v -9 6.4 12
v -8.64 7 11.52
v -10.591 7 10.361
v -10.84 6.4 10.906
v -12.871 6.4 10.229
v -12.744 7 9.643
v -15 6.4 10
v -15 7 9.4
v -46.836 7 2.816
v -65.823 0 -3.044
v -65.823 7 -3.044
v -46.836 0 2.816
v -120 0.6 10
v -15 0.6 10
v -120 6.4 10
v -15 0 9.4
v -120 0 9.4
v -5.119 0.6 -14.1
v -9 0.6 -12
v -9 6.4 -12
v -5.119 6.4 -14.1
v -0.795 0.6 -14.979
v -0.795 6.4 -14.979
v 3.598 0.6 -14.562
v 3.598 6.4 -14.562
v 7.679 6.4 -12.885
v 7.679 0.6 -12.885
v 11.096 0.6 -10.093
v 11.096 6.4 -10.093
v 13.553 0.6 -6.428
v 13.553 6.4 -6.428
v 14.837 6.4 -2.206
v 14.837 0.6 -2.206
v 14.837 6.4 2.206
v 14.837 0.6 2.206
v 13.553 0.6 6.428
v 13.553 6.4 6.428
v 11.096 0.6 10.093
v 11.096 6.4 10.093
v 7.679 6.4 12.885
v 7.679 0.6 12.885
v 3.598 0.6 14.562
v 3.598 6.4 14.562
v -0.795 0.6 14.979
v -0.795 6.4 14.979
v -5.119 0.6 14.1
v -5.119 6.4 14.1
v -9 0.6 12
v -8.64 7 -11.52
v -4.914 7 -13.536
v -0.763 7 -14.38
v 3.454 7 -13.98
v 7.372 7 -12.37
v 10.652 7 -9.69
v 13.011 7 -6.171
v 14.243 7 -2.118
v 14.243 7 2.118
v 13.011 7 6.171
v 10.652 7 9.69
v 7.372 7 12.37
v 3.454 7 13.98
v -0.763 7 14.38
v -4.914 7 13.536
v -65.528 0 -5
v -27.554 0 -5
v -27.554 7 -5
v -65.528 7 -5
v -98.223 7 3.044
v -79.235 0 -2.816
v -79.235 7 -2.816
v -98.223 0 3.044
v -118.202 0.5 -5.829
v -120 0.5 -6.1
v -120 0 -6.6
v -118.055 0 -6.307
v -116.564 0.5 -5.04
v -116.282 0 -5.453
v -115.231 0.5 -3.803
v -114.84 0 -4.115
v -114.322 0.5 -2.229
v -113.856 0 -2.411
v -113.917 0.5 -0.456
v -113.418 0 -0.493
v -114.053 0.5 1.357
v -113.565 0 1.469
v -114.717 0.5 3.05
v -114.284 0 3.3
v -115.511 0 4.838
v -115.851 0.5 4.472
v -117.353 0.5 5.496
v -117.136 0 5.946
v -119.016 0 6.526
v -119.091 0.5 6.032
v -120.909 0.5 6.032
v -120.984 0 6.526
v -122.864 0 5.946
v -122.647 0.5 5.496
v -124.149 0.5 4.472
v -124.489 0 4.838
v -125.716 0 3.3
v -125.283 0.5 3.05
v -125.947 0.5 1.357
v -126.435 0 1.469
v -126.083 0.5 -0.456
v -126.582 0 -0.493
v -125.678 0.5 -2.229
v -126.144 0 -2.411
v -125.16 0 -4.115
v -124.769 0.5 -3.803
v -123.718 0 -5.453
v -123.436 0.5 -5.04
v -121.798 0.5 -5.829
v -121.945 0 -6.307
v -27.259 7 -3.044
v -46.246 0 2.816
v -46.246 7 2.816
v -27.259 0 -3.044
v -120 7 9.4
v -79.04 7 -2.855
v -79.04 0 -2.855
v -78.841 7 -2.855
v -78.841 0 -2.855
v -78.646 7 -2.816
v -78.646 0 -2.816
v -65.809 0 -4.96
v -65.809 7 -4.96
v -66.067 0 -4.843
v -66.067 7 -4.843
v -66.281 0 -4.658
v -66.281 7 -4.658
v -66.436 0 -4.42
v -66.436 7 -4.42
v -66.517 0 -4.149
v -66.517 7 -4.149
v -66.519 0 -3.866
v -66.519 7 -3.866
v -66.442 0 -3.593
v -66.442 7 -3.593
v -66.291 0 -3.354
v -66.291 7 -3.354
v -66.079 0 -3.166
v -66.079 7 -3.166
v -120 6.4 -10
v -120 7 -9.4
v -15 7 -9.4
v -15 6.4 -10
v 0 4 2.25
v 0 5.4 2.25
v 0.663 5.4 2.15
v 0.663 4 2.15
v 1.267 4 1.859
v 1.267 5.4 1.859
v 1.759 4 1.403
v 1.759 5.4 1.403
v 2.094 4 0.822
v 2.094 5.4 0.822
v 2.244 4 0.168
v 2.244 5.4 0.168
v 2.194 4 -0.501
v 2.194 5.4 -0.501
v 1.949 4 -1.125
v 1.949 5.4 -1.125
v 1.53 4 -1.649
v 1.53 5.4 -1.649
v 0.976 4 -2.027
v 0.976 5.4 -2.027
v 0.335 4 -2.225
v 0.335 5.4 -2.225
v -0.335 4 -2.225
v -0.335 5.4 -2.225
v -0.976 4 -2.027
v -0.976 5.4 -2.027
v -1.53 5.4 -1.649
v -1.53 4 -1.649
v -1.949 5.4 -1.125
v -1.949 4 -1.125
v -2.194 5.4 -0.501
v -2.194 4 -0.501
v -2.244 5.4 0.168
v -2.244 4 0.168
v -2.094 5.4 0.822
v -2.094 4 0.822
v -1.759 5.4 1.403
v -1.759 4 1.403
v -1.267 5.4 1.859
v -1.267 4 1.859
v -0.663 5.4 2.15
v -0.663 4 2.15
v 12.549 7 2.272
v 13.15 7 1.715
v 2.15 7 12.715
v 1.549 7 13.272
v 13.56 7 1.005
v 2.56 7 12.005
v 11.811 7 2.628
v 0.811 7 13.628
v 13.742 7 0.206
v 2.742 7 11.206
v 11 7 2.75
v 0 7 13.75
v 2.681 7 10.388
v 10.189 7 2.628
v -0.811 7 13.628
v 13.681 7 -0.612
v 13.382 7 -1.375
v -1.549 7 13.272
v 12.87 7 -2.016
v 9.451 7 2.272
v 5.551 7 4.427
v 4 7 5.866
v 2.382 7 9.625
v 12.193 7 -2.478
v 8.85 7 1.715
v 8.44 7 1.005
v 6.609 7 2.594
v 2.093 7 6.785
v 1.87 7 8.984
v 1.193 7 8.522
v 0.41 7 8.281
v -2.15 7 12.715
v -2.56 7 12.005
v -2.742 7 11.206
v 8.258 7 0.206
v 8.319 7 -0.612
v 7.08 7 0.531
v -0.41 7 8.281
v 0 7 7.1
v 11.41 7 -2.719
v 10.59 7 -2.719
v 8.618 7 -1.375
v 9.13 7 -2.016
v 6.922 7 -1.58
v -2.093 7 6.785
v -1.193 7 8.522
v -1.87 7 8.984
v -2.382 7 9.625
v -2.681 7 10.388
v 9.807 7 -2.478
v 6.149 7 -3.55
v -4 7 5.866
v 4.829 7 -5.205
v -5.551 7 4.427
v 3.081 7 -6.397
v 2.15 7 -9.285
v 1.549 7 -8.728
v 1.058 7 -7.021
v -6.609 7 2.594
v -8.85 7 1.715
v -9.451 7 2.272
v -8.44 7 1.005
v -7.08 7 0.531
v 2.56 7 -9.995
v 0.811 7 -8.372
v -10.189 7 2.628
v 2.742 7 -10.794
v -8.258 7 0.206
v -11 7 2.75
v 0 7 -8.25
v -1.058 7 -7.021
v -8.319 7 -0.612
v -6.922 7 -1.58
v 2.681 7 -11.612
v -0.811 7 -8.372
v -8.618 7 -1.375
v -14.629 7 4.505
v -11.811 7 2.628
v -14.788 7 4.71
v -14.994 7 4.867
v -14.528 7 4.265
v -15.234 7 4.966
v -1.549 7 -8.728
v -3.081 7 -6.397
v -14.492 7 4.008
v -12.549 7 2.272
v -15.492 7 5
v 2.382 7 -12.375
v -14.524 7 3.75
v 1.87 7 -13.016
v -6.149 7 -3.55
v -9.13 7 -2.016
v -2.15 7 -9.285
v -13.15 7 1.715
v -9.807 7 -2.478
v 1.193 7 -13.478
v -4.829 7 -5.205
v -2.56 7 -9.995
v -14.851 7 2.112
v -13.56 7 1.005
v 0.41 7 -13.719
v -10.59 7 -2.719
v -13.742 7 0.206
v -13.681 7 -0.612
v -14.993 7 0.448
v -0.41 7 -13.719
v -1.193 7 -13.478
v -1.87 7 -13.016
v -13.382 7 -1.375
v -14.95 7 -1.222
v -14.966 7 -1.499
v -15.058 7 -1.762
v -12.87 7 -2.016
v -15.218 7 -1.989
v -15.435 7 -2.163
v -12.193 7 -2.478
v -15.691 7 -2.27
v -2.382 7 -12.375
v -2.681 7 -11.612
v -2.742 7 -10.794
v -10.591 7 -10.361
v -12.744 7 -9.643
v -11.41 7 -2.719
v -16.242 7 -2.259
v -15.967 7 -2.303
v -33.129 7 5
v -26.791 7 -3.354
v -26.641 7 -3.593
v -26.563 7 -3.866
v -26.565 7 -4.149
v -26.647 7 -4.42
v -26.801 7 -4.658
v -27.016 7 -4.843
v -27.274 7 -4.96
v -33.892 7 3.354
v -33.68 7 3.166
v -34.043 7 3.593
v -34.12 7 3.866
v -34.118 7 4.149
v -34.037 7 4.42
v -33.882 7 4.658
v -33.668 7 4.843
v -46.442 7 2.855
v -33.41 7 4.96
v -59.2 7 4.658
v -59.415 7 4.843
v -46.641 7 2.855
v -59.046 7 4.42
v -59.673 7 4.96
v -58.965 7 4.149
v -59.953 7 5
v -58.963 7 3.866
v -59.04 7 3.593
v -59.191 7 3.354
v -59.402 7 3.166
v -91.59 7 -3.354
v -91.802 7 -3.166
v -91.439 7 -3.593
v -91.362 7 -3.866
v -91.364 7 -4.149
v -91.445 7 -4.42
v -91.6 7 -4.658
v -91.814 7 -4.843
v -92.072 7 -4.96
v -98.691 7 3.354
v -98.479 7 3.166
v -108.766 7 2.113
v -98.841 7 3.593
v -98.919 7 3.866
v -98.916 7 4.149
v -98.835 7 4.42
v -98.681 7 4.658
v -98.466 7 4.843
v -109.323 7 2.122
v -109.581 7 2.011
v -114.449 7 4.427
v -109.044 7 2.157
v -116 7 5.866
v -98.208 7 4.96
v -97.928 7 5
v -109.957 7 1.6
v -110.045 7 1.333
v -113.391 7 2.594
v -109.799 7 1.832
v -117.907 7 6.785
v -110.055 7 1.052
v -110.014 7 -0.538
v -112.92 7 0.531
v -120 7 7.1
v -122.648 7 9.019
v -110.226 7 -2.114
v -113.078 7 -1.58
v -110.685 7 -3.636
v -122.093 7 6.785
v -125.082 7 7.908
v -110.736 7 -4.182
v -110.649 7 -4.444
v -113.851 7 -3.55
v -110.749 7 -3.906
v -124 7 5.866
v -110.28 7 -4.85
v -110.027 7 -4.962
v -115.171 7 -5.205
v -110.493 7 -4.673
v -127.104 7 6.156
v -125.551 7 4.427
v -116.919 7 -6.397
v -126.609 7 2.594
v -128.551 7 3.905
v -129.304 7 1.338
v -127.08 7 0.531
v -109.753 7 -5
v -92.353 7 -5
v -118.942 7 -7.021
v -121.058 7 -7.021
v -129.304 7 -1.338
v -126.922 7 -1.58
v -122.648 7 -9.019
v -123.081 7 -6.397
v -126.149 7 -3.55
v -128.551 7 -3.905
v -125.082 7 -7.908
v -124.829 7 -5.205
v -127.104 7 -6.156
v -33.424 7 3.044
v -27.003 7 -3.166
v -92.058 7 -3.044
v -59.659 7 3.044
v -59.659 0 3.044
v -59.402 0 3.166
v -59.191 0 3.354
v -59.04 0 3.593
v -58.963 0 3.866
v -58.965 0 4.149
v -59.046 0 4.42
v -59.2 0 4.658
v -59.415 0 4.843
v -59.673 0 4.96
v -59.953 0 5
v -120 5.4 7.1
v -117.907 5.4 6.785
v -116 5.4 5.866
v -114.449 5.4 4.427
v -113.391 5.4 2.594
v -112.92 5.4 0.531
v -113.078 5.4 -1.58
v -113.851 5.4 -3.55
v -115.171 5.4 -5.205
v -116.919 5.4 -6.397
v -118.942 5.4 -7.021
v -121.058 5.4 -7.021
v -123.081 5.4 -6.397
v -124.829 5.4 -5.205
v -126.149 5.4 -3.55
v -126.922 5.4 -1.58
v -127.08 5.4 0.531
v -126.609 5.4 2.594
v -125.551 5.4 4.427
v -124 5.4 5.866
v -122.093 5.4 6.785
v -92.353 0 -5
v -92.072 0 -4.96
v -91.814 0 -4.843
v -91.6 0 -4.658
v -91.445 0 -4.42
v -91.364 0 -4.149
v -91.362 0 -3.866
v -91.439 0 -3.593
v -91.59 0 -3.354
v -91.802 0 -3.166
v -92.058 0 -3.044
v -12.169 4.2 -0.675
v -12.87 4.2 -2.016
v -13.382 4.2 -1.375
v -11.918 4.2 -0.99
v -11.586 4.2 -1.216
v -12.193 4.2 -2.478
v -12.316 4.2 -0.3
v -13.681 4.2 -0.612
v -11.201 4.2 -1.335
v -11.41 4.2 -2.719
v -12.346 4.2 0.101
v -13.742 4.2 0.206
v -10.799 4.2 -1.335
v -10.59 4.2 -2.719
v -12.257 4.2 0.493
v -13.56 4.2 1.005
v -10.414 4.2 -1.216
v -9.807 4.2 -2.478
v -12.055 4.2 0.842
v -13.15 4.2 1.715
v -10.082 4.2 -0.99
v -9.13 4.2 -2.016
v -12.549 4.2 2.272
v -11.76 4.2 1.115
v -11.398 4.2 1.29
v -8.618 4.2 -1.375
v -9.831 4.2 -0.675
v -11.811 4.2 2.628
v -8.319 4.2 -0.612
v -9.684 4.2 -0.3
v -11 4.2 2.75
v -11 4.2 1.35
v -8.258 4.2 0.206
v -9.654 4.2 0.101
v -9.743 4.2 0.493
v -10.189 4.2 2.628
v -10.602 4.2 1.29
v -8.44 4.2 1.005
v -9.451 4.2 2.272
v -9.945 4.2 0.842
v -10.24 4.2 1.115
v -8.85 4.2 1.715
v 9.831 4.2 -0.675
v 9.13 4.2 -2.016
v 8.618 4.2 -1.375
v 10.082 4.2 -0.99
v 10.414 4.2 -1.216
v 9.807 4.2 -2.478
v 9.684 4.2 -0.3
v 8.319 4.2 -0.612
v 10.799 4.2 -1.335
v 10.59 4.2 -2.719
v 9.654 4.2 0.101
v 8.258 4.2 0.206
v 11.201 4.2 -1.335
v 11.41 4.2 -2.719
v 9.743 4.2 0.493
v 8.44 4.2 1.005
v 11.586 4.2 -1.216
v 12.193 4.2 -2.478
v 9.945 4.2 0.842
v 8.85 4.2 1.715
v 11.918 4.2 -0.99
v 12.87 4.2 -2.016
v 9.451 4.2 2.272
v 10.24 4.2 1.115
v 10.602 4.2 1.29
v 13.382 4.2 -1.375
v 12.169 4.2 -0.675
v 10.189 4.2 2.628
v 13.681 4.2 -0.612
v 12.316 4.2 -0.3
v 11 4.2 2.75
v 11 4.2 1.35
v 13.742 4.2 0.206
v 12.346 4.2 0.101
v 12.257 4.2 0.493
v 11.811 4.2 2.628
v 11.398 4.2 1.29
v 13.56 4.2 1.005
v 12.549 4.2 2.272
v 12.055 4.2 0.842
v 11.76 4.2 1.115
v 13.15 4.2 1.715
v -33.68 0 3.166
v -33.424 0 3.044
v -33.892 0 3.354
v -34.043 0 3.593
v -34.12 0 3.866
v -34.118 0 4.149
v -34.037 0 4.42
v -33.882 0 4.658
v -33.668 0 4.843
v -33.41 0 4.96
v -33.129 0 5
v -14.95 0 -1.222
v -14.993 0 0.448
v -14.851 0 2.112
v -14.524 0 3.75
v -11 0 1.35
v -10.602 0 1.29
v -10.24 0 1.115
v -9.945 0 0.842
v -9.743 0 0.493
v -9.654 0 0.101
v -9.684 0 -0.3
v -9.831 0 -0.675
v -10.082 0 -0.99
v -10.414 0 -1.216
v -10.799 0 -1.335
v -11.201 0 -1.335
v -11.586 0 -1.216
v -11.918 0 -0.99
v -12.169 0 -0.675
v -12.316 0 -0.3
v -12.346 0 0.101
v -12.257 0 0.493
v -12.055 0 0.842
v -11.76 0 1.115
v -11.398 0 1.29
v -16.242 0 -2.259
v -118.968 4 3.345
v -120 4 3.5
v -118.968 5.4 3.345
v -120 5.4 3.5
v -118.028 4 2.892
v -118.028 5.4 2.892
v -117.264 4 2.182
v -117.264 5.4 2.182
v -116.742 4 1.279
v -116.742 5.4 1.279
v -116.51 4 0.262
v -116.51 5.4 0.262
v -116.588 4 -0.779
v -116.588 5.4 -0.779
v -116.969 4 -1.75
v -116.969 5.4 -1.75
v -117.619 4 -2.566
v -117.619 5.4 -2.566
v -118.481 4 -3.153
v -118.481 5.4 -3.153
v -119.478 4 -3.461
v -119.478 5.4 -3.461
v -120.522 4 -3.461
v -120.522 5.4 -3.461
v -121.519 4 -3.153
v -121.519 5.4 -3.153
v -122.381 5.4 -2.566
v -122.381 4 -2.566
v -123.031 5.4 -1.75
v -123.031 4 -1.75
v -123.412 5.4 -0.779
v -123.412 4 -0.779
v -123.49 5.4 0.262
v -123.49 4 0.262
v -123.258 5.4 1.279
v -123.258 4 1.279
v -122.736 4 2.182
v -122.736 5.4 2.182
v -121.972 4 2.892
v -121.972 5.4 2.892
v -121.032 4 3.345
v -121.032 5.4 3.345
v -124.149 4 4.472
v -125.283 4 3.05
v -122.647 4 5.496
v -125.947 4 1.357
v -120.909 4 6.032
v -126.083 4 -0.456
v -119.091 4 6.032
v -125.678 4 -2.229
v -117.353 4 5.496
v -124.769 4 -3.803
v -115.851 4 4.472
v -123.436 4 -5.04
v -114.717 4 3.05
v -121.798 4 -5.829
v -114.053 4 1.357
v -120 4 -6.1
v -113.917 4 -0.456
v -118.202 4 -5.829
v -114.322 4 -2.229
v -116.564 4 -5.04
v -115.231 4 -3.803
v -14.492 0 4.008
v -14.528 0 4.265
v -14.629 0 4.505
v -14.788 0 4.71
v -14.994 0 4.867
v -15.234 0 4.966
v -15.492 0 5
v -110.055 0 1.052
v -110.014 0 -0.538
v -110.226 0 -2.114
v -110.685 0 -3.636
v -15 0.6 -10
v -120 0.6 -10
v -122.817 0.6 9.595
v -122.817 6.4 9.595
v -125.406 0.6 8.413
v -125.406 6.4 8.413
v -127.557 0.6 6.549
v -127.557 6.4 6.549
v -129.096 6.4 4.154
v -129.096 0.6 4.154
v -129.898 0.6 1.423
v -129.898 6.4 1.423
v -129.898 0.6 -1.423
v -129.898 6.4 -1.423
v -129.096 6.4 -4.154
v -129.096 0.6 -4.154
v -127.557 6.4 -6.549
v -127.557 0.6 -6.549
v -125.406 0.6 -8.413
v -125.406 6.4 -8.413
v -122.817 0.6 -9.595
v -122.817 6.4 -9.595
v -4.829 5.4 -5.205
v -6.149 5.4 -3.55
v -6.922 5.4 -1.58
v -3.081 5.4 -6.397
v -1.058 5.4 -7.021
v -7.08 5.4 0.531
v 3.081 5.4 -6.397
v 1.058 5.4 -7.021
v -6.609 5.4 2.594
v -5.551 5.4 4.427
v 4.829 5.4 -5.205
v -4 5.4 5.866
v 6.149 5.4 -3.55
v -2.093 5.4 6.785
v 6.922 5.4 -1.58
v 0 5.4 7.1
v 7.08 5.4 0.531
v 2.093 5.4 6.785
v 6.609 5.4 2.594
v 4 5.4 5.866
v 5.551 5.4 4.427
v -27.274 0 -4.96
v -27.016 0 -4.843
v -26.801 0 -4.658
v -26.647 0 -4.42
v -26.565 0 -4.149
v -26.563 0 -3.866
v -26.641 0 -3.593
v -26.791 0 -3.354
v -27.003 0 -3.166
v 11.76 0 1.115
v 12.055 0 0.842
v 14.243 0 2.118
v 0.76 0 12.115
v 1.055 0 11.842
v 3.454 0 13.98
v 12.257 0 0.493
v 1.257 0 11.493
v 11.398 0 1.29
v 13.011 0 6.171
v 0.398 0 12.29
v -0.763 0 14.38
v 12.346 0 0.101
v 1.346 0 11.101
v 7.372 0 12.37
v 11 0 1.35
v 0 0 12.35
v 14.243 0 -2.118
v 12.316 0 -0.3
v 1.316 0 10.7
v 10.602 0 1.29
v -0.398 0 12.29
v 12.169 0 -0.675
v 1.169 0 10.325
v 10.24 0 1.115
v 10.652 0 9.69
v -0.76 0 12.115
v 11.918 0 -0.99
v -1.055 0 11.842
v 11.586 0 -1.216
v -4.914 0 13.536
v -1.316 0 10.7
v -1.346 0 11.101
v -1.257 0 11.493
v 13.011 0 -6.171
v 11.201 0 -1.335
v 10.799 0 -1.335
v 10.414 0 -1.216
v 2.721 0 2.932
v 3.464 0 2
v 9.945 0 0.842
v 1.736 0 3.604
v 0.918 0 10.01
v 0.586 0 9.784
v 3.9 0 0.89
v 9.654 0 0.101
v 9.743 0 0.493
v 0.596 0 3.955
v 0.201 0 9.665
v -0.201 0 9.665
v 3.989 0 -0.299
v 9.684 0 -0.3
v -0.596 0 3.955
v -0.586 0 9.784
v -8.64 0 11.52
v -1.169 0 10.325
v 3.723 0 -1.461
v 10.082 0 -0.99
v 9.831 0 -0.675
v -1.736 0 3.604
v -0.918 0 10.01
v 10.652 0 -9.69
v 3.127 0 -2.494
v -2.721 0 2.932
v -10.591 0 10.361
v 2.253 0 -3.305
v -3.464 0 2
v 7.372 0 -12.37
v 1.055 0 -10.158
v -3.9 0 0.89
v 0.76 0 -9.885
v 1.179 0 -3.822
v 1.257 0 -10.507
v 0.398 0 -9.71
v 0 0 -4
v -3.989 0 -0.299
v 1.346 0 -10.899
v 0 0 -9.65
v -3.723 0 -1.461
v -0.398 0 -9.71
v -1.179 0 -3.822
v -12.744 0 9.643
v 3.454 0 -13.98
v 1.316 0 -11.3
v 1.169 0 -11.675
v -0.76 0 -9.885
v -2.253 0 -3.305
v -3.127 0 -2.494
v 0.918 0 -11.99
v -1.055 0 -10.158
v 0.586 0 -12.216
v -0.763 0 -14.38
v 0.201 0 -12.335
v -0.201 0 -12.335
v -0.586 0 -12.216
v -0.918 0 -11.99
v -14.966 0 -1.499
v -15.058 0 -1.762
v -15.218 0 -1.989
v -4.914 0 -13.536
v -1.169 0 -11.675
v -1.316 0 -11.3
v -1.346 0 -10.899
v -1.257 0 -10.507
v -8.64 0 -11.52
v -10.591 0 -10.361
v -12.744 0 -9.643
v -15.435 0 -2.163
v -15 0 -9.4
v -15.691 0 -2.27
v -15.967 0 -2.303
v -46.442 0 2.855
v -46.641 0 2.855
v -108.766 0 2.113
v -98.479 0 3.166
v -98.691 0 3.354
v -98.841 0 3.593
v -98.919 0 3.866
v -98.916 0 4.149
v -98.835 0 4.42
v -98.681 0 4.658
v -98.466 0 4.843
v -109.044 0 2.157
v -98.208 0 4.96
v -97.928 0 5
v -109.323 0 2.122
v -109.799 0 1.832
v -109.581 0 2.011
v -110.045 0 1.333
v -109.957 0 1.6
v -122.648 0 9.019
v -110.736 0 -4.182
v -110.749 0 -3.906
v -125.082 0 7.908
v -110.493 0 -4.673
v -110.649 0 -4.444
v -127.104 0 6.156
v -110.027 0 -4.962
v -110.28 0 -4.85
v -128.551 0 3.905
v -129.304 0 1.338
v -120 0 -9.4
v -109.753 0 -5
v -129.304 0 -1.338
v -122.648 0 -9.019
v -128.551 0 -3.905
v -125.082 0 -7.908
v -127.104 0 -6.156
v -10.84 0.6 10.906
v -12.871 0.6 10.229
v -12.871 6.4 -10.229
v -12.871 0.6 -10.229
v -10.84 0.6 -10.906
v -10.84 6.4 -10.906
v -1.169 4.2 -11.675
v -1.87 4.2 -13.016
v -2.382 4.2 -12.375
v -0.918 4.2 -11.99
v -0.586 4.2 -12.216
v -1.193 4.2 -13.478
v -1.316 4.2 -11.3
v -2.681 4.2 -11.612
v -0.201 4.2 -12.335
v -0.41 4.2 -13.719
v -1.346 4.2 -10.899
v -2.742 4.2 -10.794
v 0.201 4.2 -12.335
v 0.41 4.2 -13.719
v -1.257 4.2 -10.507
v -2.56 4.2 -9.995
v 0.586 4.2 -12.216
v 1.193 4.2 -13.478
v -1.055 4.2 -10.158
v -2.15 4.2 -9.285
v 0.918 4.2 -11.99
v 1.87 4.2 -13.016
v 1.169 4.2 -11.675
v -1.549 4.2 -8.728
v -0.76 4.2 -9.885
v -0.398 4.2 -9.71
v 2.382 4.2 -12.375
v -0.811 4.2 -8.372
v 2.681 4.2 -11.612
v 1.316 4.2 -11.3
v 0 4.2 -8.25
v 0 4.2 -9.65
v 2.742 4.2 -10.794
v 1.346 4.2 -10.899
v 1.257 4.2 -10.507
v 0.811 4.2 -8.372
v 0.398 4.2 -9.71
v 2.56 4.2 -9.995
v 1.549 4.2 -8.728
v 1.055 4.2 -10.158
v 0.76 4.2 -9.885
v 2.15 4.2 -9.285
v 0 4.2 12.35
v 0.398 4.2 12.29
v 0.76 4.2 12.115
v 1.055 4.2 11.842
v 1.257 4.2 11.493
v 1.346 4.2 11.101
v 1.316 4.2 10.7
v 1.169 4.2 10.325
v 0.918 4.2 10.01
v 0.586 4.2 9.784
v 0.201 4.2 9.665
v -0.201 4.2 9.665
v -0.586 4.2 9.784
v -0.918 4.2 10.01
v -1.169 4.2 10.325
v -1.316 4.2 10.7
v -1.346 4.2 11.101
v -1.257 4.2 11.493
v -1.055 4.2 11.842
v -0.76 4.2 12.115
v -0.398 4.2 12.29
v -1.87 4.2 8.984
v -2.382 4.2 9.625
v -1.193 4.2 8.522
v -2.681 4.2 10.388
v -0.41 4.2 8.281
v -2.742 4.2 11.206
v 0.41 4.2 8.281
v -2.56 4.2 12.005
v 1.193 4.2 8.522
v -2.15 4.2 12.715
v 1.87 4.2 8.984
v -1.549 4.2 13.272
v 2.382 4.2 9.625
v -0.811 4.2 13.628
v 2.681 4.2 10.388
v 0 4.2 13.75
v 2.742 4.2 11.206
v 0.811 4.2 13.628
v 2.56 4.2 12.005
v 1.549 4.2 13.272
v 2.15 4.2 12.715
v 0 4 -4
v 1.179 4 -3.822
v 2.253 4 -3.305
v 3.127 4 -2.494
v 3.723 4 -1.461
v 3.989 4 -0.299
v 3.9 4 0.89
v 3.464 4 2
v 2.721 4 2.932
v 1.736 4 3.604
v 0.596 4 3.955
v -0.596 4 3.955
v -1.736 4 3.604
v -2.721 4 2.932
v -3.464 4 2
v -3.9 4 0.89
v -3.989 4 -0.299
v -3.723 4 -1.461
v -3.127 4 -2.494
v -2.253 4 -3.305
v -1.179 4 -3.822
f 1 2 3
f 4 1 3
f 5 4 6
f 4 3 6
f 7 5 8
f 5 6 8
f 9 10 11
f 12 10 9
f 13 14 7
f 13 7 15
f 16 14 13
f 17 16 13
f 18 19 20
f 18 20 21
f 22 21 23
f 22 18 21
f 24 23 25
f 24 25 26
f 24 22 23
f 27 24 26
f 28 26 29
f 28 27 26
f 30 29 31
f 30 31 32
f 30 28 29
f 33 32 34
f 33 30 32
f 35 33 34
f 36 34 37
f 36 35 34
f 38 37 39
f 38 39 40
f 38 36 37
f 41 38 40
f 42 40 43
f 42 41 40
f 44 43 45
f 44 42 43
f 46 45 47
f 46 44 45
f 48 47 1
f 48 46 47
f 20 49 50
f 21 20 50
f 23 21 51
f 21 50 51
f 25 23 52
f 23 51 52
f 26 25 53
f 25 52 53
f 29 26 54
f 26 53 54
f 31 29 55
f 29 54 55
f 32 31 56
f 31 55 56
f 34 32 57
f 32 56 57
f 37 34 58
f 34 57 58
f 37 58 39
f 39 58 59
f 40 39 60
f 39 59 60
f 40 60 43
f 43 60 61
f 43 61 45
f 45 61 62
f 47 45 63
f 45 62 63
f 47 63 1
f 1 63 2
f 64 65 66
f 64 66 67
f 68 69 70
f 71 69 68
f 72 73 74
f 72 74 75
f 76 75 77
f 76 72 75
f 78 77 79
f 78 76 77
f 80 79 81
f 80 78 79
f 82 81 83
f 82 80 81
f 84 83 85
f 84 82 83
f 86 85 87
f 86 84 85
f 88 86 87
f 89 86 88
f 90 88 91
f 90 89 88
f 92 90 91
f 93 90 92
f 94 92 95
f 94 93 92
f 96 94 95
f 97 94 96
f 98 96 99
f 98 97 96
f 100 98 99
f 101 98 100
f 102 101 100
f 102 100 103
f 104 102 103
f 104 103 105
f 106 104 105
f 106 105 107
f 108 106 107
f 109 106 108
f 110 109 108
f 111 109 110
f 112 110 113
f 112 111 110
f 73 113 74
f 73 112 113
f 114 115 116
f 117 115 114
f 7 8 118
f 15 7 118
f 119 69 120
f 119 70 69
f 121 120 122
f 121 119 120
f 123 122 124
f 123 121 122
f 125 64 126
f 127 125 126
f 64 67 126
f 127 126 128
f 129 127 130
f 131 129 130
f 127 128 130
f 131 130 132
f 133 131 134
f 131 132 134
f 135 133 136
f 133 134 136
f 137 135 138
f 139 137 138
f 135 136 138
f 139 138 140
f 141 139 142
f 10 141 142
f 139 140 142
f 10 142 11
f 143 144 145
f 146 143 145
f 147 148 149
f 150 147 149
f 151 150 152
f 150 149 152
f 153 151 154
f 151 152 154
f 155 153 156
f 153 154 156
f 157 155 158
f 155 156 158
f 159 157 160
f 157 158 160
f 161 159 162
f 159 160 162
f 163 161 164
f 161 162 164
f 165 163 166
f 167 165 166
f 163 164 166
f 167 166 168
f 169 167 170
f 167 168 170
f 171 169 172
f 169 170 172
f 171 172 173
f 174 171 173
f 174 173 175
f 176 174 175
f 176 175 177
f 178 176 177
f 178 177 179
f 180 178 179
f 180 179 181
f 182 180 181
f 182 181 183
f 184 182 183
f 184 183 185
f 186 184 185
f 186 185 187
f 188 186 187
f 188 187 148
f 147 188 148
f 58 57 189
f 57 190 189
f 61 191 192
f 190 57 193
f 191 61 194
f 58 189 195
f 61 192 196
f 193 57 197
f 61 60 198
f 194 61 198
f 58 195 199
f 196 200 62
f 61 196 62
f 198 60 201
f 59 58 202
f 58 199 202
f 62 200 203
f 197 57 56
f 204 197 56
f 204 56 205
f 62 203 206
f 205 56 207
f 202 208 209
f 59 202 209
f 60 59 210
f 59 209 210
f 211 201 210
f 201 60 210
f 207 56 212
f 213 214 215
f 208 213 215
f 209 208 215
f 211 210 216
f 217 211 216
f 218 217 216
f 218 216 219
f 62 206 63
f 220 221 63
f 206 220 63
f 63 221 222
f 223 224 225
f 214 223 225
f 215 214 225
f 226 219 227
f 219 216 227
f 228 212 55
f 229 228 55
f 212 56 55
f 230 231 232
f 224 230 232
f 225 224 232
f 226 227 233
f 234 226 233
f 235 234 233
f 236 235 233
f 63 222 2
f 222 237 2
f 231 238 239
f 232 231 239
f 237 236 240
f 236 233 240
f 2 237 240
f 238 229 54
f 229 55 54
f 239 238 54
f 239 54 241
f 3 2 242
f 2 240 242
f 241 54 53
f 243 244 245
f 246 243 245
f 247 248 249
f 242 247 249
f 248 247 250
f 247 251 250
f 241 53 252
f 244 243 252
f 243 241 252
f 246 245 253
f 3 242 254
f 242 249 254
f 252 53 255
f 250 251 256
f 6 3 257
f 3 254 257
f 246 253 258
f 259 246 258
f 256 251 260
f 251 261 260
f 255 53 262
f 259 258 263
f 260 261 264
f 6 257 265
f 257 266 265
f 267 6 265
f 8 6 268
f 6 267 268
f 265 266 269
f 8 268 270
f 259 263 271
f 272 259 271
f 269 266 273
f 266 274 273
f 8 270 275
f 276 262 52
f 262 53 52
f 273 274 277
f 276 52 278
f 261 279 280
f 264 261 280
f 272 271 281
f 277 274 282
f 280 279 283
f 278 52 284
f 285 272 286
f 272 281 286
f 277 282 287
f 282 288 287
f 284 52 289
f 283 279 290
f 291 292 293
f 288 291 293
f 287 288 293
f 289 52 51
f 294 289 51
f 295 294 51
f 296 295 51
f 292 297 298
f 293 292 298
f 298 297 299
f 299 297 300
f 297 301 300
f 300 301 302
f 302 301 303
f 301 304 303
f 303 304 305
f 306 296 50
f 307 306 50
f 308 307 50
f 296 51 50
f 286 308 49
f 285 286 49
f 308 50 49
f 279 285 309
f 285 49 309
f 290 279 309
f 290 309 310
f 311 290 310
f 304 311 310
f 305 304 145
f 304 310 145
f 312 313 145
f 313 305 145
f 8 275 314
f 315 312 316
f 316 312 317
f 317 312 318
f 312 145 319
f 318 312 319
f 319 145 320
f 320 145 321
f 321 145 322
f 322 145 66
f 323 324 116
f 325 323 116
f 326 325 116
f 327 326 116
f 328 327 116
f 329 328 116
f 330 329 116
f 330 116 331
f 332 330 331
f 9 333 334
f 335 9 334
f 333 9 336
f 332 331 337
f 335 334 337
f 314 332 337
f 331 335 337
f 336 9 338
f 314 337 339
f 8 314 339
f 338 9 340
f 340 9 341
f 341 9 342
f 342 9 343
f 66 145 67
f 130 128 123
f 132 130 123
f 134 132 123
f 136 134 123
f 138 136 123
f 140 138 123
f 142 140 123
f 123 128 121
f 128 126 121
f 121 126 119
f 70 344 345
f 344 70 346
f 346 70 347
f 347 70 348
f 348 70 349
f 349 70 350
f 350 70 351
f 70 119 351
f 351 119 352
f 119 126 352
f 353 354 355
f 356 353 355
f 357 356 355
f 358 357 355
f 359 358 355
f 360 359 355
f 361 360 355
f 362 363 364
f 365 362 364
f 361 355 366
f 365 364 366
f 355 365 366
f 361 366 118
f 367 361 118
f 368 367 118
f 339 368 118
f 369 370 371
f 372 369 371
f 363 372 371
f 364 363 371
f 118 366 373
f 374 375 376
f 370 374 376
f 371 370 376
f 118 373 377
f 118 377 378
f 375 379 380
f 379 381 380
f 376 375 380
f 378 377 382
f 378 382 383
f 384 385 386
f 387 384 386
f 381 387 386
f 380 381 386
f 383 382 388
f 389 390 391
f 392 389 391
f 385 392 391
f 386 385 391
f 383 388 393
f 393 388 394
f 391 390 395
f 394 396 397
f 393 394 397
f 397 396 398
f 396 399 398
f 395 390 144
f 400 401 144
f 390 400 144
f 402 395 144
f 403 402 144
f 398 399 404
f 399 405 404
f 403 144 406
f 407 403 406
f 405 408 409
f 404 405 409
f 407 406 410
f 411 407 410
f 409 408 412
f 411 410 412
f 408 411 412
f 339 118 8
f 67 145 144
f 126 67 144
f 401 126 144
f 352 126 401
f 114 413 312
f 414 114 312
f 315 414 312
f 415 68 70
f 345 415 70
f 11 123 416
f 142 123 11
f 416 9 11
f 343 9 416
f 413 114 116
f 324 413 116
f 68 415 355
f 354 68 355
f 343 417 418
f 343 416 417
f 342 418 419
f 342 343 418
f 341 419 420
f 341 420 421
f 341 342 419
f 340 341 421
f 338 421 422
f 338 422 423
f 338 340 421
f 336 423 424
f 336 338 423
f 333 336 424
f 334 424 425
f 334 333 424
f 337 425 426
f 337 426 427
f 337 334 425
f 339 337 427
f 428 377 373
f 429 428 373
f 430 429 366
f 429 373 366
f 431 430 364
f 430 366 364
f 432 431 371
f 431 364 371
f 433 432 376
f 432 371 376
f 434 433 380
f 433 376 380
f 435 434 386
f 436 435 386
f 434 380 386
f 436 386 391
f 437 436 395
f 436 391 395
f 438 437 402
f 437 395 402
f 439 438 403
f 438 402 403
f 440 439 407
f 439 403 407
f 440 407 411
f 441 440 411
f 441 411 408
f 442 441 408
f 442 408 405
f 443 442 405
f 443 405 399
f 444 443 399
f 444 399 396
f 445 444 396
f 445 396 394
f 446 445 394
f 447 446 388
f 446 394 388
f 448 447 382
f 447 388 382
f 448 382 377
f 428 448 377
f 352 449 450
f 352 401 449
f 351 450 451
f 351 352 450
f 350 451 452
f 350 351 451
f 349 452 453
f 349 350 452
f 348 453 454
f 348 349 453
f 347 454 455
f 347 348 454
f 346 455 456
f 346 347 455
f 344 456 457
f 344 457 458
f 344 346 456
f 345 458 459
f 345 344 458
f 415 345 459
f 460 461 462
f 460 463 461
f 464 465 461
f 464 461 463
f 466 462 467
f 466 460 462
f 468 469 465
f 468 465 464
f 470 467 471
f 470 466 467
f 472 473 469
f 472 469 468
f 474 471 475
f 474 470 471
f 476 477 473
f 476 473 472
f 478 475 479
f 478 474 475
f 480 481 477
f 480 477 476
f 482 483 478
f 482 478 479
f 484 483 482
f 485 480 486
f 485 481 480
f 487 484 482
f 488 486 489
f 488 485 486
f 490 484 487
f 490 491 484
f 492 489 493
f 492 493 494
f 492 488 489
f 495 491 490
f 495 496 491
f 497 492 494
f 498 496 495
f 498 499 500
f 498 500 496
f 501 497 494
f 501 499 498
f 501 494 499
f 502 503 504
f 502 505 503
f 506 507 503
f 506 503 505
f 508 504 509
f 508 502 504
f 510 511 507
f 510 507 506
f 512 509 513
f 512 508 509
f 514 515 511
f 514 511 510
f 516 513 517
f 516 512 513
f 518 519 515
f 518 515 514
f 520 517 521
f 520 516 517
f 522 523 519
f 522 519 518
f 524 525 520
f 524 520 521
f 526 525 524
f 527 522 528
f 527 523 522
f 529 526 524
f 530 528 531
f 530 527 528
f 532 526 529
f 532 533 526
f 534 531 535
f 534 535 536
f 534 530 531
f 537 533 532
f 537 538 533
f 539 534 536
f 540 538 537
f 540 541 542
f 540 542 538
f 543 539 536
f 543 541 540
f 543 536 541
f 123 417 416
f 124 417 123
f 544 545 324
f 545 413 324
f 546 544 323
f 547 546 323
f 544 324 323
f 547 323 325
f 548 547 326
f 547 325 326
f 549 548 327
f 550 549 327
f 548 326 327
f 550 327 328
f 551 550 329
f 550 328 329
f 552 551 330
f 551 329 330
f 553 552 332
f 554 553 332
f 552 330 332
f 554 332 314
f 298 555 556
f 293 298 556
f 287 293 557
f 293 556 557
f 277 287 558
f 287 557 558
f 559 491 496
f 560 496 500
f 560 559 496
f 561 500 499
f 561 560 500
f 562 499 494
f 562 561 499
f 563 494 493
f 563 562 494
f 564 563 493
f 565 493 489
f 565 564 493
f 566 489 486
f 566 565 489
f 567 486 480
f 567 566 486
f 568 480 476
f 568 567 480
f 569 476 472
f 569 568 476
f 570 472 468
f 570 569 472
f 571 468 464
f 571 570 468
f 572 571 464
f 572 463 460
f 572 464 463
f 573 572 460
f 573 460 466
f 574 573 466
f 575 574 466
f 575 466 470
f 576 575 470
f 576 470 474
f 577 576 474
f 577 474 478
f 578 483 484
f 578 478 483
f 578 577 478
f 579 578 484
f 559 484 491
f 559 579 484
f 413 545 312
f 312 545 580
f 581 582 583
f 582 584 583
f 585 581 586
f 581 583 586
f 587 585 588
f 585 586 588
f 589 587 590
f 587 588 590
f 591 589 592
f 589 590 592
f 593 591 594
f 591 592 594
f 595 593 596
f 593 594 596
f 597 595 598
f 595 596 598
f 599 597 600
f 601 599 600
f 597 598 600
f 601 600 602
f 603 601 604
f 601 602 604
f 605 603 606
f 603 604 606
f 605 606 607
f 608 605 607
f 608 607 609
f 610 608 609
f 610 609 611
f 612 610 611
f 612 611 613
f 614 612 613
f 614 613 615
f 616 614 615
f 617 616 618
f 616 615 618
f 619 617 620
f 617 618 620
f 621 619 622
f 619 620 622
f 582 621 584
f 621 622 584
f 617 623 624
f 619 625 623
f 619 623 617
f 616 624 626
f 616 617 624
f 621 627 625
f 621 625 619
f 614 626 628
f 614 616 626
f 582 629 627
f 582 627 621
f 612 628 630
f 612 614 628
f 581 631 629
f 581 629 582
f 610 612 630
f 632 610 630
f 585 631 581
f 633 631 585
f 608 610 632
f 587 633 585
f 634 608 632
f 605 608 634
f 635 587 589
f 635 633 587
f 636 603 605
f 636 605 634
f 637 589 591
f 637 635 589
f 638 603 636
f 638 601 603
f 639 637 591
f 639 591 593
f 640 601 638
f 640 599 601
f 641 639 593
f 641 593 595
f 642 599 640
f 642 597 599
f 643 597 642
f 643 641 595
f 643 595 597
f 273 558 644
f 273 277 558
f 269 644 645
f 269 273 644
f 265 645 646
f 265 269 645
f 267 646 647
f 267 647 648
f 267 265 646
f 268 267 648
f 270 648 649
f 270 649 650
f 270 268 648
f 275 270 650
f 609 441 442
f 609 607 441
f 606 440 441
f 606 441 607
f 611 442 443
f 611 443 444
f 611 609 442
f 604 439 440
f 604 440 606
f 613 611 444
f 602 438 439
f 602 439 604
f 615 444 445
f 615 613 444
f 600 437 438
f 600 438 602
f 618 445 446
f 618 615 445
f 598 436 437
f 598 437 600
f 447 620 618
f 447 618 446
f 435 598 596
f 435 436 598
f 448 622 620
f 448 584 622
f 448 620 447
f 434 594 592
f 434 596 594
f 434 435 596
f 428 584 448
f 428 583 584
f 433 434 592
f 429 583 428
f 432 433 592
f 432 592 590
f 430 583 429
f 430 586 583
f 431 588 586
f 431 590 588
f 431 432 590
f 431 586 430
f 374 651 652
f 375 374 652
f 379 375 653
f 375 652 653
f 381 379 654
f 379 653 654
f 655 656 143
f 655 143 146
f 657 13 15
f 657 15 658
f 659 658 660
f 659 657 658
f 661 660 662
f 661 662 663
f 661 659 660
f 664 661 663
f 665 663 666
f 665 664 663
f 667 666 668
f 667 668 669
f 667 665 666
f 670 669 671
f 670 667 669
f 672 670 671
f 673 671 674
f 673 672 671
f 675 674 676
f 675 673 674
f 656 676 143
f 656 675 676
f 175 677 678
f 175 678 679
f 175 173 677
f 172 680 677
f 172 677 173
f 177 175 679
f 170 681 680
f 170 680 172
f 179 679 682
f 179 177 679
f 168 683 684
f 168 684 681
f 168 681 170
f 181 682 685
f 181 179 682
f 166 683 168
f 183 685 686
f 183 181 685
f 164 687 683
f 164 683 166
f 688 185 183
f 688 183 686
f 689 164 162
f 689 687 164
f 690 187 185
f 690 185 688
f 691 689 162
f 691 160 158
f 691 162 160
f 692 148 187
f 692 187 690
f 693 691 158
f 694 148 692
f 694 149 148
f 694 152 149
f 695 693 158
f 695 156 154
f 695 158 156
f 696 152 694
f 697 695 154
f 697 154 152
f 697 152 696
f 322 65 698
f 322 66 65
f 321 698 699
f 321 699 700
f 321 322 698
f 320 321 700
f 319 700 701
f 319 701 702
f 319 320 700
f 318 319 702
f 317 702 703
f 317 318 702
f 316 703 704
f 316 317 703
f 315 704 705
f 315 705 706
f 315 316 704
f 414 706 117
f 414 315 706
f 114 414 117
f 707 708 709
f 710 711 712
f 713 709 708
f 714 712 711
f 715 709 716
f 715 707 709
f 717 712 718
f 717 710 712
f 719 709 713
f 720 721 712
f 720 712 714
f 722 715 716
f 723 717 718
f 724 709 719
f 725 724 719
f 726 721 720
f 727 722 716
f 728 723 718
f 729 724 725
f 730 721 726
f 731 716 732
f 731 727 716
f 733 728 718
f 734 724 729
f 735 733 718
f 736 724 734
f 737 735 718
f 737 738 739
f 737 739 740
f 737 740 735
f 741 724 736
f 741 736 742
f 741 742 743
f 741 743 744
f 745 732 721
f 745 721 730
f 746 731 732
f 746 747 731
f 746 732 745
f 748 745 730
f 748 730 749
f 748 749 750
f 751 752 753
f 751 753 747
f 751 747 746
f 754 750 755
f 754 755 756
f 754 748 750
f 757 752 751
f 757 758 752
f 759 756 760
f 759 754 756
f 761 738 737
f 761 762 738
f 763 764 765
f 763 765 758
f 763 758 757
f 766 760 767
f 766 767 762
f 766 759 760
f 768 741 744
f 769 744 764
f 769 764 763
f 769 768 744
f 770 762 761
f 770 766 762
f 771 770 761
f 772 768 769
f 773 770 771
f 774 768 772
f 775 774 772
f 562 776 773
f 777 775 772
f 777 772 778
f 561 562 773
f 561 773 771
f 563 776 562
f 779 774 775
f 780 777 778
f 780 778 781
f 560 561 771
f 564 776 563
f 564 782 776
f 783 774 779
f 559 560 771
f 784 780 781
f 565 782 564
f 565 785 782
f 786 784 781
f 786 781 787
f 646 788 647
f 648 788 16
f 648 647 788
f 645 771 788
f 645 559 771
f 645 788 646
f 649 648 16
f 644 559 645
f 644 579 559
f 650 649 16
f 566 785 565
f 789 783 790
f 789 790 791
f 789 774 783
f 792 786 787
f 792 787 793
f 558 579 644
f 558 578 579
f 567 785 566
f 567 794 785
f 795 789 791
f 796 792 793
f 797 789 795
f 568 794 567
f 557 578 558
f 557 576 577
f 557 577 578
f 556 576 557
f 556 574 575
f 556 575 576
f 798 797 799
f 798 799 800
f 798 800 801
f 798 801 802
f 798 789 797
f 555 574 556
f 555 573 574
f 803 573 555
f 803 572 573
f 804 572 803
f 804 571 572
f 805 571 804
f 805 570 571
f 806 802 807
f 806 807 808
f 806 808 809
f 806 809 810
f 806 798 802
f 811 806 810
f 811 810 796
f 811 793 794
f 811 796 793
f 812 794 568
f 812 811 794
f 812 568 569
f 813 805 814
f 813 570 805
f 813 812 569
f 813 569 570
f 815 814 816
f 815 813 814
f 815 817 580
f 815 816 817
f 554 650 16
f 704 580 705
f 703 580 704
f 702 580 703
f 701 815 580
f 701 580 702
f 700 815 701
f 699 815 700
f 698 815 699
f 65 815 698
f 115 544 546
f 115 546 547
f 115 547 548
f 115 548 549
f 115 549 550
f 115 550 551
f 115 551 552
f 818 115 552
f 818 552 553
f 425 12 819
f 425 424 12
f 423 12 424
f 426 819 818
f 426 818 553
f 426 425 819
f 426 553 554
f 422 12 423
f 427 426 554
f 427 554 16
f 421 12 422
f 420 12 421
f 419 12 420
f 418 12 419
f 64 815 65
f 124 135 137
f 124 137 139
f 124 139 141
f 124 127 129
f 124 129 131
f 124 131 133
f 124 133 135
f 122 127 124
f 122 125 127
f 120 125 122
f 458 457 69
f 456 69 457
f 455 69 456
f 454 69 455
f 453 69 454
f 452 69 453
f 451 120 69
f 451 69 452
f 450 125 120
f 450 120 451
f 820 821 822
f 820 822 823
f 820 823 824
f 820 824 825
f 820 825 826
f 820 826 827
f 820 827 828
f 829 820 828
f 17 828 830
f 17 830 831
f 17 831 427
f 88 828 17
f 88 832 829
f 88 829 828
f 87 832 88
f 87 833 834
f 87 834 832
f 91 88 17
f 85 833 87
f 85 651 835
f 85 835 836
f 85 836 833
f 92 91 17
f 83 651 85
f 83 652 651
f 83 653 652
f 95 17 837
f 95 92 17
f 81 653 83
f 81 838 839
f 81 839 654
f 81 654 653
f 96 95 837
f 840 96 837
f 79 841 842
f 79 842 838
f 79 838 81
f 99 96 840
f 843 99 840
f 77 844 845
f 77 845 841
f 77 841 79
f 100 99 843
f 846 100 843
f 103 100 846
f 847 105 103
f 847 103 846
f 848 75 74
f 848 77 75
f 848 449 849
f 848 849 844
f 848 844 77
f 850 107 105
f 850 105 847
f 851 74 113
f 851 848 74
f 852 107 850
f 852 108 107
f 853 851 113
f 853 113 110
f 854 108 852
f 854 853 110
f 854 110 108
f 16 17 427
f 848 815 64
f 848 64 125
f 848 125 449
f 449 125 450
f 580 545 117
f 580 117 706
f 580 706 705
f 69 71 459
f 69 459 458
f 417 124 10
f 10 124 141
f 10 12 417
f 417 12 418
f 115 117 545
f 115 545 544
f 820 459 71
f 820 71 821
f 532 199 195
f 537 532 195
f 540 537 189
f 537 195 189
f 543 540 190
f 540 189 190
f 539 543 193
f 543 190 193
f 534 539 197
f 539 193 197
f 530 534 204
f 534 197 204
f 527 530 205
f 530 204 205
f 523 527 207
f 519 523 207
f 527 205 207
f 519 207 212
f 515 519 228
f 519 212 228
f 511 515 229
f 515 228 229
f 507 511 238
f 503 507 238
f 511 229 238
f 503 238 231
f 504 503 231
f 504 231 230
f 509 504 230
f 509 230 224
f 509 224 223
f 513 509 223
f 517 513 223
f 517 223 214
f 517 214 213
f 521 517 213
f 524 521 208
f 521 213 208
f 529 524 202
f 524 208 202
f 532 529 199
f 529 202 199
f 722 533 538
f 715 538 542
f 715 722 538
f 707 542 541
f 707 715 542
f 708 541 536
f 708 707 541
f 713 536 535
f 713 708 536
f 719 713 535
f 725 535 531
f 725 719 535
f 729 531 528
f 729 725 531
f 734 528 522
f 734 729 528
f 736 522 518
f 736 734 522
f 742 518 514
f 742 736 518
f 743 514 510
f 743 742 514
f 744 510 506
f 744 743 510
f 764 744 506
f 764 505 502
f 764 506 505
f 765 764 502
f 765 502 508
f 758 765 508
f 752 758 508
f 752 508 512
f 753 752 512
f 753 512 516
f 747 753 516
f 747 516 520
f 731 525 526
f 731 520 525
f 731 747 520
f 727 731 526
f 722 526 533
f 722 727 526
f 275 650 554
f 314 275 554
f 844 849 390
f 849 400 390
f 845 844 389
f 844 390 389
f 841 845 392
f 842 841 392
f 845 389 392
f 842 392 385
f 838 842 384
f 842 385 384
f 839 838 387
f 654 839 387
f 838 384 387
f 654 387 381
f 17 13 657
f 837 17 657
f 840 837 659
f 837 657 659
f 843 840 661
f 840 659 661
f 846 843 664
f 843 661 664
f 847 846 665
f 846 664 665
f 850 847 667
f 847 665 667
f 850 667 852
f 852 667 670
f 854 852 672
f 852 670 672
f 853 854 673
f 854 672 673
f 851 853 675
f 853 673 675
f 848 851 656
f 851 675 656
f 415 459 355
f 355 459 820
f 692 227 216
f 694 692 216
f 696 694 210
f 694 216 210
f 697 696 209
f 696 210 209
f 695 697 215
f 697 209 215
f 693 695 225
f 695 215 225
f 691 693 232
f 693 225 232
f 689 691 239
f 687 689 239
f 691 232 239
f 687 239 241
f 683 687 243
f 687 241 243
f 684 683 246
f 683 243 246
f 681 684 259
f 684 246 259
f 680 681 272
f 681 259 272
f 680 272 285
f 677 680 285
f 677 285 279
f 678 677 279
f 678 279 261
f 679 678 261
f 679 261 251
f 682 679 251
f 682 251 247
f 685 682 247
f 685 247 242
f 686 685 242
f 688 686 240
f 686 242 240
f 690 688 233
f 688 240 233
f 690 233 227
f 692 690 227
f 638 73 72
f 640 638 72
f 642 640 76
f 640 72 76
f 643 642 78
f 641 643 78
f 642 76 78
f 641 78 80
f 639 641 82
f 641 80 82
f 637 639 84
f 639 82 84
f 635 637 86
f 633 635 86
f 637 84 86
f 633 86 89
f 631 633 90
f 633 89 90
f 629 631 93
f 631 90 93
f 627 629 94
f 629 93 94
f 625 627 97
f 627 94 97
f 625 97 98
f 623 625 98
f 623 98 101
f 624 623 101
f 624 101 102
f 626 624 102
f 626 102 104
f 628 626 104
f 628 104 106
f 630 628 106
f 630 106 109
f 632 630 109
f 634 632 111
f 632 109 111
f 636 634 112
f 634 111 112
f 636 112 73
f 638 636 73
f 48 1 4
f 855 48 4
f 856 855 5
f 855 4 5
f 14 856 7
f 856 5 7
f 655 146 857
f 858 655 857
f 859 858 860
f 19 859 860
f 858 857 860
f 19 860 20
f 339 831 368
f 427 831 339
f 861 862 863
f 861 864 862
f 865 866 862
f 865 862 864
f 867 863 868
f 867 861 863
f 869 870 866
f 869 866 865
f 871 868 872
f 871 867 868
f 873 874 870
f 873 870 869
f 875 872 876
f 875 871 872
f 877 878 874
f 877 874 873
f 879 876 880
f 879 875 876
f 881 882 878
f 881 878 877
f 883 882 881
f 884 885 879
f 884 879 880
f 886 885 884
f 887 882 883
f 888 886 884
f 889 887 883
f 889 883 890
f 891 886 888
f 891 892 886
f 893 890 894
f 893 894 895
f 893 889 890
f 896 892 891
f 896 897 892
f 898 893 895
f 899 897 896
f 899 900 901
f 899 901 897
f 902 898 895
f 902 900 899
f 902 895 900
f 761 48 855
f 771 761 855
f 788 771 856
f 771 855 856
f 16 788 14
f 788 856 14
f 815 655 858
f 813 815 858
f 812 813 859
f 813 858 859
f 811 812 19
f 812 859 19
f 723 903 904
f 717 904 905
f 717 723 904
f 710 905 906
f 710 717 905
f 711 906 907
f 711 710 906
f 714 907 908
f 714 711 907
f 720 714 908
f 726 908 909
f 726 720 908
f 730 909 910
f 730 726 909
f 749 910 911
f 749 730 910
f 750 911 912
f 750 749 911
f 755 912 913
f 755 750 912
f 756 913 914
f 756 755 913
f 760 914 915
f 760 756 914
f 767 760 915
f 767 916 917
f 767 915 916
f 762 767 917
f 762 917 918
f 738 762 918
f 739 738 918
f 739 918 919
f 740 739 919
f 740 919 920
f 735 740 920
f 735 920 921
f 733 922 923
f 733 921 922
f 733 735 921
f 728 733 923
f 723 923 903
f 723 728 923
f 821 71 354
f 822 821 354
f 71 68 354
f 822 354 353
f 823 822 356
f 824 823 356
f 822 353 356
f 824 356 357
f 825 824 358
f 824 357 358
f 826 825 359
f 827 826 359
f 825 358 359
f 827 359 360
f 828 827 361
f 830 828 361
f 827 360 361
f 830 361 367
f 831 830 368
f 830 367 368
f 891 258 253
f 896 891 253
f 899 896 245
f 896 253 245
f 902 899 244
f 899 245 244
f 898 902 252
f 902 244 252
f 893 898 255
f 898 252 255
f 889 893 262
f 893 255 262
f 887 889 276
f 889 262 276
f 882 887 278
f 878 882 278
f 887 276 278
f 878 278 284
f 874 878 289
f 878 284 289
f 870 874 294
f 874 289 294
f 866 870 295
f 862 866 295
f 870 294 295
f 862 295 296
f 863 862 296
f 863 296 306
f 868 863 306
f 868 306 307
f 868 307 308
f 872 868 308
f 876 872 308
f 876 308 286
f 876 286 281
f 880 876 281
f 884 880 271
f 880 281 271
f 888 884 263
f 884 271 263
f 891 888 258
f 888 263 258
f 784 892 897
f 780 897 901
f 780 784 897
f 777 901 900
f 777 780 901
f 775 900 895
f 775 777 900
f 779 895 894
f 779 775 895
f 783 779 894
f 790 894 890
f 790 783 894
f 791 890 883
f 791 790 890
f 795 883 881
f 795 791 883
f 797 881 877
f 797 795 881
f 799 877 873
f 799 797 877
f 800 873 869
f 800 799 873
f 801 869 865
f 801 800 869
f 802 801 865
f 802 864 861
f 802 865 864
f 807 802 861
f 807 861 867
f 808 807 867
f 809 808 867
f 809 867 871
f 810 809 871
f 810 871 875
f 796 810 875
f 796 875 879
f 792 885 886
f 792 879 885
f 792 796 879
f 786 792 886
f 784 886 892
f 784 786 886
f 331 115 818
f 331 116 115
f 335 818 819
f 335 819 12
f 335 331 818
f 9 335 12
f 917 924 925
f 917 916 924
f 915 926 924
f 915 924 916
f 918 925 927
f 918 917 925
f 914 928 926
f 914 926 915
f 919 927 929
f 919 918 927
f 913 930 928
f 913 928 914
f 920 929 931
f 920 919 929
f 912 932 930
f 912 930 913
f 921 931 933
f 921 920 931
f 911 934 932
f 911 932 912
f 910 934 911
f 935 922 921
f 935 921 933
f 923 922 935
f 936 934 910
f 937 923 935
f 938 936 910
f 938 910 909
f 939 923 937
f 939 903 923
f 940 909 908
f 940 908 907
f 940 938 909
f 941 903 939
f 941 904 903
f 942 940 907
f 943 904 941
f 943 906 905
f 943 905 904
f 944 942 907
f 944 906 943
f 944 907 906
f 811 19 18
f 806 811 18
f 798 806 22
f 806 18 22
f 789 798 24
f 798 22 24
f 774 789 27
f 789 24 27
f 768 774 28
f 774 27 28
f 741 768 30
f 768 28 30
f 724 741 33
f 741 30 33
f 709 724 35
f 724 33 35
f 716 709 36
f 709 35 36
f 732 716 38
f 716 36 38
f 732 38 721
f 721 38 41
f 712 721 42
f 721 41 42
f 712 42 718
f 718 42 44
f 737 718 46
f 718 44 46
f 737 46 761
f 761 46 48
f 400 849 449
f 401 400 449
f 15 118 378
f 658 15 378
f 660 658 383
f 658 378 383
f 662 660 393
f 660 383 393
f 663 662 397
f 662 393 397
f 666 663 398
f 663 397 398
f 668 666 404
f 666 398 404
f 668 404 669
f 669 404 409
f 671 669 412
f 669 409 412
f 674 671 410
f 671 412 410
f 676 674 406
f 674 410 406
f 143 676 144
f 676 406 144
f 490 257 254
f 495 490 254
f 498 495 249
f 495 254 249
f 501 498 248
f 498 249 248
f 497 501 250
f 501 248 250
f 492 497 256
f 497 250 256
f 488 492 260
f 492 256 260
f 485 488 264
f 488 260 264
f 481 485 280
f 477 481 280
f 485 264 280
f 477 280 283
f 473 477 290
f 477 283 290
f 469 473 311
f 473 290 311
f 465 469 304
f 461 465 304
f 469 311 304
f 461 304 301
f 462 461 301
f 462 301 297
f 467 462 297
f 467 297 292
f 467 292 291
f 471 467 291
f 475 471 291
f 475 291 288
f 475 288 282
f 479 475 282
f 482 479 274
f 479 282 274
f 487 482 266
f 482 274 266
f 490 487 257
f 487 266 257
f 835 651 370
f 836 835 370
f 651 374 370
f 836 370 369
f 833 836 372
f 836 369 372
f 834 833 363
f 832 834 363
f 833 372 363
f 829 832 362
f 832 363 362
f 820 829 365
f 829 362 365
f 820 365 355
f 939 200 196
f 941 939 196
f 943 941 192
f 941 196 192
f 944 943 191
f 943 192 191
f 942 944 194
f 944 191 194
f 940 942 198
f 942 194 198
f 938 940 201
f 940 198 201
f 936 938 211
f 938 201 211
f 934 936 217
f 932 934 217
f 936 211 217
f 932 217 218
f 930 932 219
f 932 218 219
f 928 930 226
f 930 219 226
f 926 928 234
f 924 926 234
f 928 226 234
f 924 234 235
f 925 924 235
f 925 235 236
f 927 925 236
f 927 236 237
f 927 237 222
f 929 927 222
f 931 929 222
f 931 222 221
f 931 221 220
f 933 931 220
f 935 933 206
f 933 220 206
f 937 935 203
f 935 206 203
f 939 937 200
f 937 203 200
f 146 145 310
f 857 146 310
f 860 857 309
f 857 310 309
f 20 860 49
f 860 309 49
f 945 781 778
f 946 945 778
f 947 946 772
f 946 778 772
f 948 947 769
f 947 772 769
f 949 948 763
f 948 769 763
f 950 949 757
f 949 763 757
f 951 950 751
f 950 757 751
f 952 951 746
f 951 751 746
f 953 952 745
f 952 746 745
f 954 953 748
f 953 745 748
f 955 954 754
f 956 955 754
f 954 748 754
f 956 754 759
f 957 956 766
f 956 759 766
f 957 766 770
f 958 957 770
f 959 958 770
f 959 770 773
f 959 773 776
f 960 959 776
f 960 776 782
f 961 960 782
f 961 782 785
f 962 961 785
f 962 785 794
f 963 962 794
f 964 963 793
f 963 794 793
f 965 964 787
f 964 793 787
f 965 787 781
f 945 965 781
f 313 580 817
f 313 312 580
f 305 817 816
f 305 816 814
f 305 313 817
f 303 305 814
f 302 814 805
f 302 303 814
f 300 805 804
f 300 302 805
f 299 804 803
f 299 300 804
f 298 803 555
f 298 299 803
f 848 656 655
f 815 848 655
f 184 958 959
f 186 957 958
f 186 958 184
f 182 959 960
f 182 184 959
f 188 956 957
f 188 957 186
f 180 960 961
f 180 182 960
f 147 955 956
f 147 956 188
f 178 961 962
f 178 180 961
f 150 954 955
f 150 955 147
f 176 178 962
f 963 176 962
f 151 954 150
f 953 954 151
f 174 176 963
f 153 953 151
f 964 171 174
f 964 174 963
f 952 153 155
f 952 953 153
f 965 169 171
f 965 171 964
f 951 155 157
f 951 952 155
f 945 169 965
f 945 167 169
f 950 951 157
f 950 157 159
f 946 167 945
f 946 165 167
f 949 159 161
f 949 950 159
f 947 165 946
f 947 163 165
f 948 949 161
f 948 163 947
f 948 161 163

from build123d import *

# Parameters (mm, degrees)
SKETCH_1_R          = 1.35
EXTRUDE_1_DEPTH     = 7
FILLET_1_R          = 1
FILLET_2_R          = 1
FILLET_3_R          = 1
FILLET_4_R          = 1
FILLET_5_R          = 10
SKETCH_2_R          = 4
CUT_EXTRUDE_1_DEPTH = 4
SKETCH_3_R          = 6.1
CUT_EXTRUDE_2_DEPTH = 4
SKETCH_4_R          = 7.1
CUT_EXTRUDE_4_DEPTH = 1.6
SKETCH_5_R          = 7.1
CUT_EXTRUDE_5_DEPTH = 1.6
SKETCH_6_R          = 2.25
SKETCH_6_R_2        = 3.5
CUT_EXTRUDE_6_DEPTH = 5
CHAMFER_1_SIZE      = 0.6
CHAMFER_2_SIZE      = 0.5
SKETCH_7_R          = 2.75
CUT_EXTRUDE_7_DEPTH = 2.8


with BuildPart() as part:
    # 草图1 → 凸台-拉伸1 (new body)
    with BuildSketch(Plane(origin=(0, 0, 0), x_dir=(1, 0, 0), z_dir=(0, 1, 0))):
        with BuildLine():
            Line((-120, 10), (-11.180339887, 10))
            ThreePointArc((-11.180339887, 10), (15, 0), (-11.180339887, -10))
            Line((-11.180339887, -10), (-120, -10))
            ThreePointArc((-120, -10), (-130, 0), (-120, 10))
        make_face()
        with Locations(Location((-11, 0, 0), (0, 0, 270))):
            Circle(SKETCH_1_R, mode=Mode.SUBTRACT)
        with Locations(Location((0, 11, 0), (0, 0, 270))):
            Circle(SKETCH_1_R, mode=Mode.SUBTRACT)
        with Locations(Location((11, 0, 0), (0, 0, 270))):
            Circle(SKETCH_1_R, mode=Mode.SUBTRACT)
        with Locations(Location((0, -11, 0), (0, 0, 270))):
            Circle(SKETCH_1_R, mode=Mode.SUBTRACT)
        Polygon((-104.558275962, -5), (-53.32280907, -5), (-78.940542516, 2.906902245), align=None, mode=Mode.SUBTRACT)
        with BuildLine():
            Line((-111.339745962, 5), (-85.722012516, 5))
            Line((-85.722012516, 5), (-110.343778499, -2.599497322))
            ThreePointArc((-110.343778499, -2.599497322), (-110.084789012, 1.299457992), (-111.339745962, 5))
        make_face(mode=Mode.SUBTRACT)
        Polygon((-72.159072516, 5), (-46.54133907, -2.906902245), (-20.923605624, 5), align=None, mode=Mode.SUBTRACT)
        with BuildLine():
            Line((-39.75986907, -5), (-14.751545054, 2.71880829))
            ThreePointArc((-14.751545054, 2.71880829), (-14.953467696, -1.180594709), (-14.142135624, -5))
            Line((-14.142135624, -5), (-39.75986907, -5))
        make_face(mode=Mode.SUBTRACT)
    extrude(amount=EXTRUDE_1_DEPTH)

    # 圆角1
    fillet_1_edges = [part.edges().sort_by_distance(p)[0] for p in [
        (-85.722012516, 3.5, -5),
        (-111.339745962, 3.5, -5),
        (-110.343778499, 3.5, 2.599497322),
    ]]
    fillet(fillet_1_edges, radius=FILLET_1_R)

    # 圆角2
    fillet_2_edges = [part.edges().sort_by_distance(p)[0] for p in [
        (-104.558275962, 3.5, 5),
        (-53.32280907, 3.5, 5),
        (-78.940542516, 3.5, -2.906902245),
    ]]
    fillet(fillet_2_edges, radius=FILLET_2_R)

    # 圆角3
    fillet_3_edges = [part.edges().sort_by_distance(p)[0] for p in [
        (-46.54133907, 3.5, 2.906902245),
        (-20.923605624, 3.5, -5),
        (-72.159072516, 3.5, -5),
    ]]
    fillet(fillet_3_edges, radius=FILLET_3_R)

    # 圆角4
    fillet_4_edges = [part.edges().sort_by_distance(p)[0] for p in [
        (-39.75986907, 3.5, 5),
        (-14.142135624, 3.5, 5),
        (-14.751545054, 3.5, -2.71880829),
    ]]
    fillet(fillet_4_edges, radius=FILLET_4_R)

    # 圆角5
    fillet_5_edges = [part.edges().sort_by_distance(p)[0] for p in [
        (-11.180339887, 3.5, -10),
        (-11.180339887, 3.5, 10),
    ]]
    fillet(fillet_5_edges, radius=FILLET_5_R)

    # 草图2 → 切除-拉伸1 (cut)
    with BuildSketch(Plane(origin=(0, 0, 0), x_dir=(-1, 0, 0), z_dir=(0, -1, 0))):
        with Locations(Location((0, 0, 0), (0, 0, 90))):
            Circle(SKETCH_2_R)
    extrude(amount=-CUT_EXTRUDE_1_DEPTH, mode=Mode.SUBTRACT)

    # 草图3 → 切除-拉伸2 (cut)
    with BuildSketch(Plane(origin=(0, 0, 0), x_dir=(-1, 0, 0), z_dir=(0, -1, 0))):
        with Locations(Location((120, 0, 0), (0, 0, 90))):
            Circle(SKETCH_3_R)
    extrude(amount=-CUT_EXTRUDE_2_DEPTH, mode=Mode.SUBTRACT)

    # 草图4 → 切除-拉伸4 (cut)
    with BuildSketch(Plane(origin=(0, 7, 0), x_dir=(1, 0, 0), z_dir=(0, 1, 0))):
        with Locations(Location((0, 0, 0), (0, 0, 270))):
            Circle(SKETCH_4_R)
    extrude(amount=-CUT_EXTRUDE_4_DEPTH, mode=Mode.SUBTRACT)

    # 草图5 → 切除-拉伸5 (cut)
    with BuildSketch(Plane(origin=(0, 7, 0), x_dir=(1, 0, 0), z_dir=(0, 1, 0))):
        with Locations(Location((-120, 0, 0), (0, 0, 270))):
            Circle(SKETCH_5_R)
    extrude(amount=-CUT_EXTRUDE_5_DEPTH, mode=Mode.SUBTRACT)

    # 草图6 → 切除-拉伸6 (cut, symmetric)
    with BuildSketch(Plane(origin=(0, 5.4, 0), x_dir=(1, 0, 0), z_dir=(0, 1, 0))):
        with Locations(Location((0, 0, 0), (0, 0, 270))):
            Circle(SKETCH_6_R)
        with Locations(Location((-120, 0, 0), (0, 0, 270))):
            Circle(SKETCH_6_R_2)
    extrude(amount=CUT_EXTRUDE_6_DEPTH, both=True, mode=Mode.SUBTRACT)

    # 倒角1
    chamfer_1_edges = [part.edges().sort_by_distance(p)[0] for p in [
        (15, 0, 0),
        (15, 7, 0),
        (-11.83772234, 0, 10.513167019),
        (-11.83772234, 7, 10.513167019),
        (-11.83772234, 0, -10.513167019),
        (-11.83772234, 7, -10.513167019),
        (-130, 0, 0),
        (-67.5, 0, -10),
        (-67.5, 0, 10),
        (-67.5, 7, 10),
        (-67.5, 7, -10),
        (-130, 7, 0),
    ]]
    chamfer(chamfer_1_edges, length=CHAMFER_1_SIZE)

    # 倒角2
    chamfer_2_edges = [part.edges().sort_by_distance(p)[0] for p in [
        (-120, 0, 6.1),
    ]]
    chamfer(chamfer_2_edges, length=CHAMFER_2_SIZE)

    # 草图7 → 切除-拉伸7 (cut)
    with BuildSketch(Plane(origin=(0, 7, 0), x_dir=(1, 0, 0), z_dir=(0, 1, 0))):
        with Locations(Location((0, 11, 0), (0, 0, 270))):
            Circle(SKETCH_7_R)
        with Locations(Location((11, 0, 0), (0, 0, 270))):
            Circle(SKETCH_7_R)
        with Locations(Location((0, -11, 0), (0, 0, 270))):
            Circle(SKETCH_7_R)
        with Locations(Location((-11, 0, 0), (0, 0, 270))):
            Circle(SKETCH_7_R)
    extrude(amount=-CUT_EXTRUDE_7_DEPTH, mode=Mode.SUBTRACT)


solid = part.part
